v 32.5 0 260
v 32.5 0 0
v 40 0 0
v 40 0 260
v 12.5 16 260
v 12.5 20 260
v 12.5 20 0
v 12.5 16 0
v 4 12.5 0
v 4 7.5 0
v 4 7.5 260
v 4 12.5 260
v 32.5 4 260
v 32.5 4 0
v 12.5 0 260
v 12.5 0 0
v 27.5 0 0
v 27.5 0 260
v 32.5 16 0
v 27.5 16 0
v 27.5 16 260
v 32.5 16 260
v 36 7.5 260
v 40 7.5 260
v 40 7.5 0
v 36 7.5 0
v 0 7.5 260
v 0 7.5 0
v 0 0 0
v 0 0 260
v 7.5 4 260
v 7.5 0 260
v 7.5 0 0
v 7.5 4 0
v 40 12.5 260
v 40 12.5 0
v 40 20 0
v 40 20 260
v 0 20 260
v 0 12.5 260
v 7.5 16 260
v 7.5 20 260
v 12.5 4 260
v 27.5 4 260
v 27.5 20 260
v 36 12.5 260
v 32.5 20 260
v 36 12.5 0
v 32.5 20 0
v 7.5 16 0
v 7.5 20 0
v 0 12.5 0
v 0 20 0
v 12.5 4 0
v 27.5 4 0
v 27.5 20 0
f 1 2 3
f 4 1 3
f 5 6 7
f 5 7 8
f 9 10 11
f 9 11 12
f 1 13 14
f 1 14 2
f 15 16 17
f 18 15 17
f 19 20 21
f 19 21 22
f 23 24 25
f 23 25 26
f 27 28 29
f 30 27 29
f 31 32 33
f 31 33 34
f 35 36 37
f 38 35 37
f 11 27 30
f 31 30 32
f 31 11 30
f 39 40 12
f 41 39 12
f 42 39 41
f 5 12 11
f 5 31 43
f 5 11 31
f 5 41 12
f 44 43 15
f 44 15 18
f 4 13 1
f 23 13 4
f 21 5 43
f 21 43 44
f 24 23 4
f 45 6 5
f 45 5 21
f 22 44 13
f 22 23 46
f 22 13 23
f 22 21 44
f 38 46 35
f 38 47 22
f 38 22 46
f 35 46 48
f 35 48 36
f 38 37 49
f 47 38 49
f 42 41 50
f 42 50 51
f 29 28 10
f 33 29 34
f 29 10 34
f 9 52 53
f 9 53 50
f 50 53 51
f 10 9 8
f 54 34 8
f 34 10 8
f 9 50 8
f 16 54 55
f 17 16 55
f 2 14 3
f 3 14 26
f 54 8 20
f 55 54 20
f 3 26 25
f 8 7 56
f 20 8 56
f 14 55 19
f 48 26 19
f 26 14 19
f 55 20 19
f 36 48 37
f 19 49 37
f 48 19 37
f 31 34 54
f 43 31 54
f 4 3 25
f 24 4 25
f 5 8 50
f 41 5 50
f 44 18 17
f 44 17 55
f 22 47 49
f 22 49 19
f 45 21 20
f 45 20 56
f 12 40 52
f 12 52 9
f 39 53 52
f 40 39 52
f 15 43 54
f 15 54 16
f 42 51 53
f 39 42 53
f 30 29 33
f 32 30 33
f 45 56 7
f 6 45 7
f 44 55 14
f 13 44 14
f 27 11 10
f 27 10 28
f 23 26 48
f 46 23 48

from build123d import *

# Parameters (mm, degrees)
ESQUISSE1_W        = 3.5
ESQUISSE1_H        = 5
ESQUISSE1_W_2      = 5
ESQUISSE1_H_2      = 3.5
ESQUISSE1_W_3      = 4
BOSS_EXTRU_1_DEPTH = 260


with BuildPart() as part:
    # Esquisse1 → Boss.-Extru.1 (new body)
    with BuildSketch(Plane.XY):
        Polygon((7.5, 16), (7.5, 20), (0, 20), (4, 16), align=None)
        Polygon((4, 16), (0, 20), (0, 12.5), (4, 12.5), align=None)
        Polygon((4, 7.5), (0, 7.5), (0, 0), (4, 4), align=None)
        Polygon((0, 0), (7.5, 0), (7.5, 4), (4, 4), align=None)
        Polygon((4, 4), (7.5, 7.5), (4, 7.5), align=None)
        Polygon((7.5, 4), (7.5, 7.5), (4, 4), align=None)
        Polygon((4, 12.5), (7.5, 12.5), (4, 16), align=None)
        Polygon((7.5, 12.5), (7.5, 16), (4, 16), align=None)
        with Locations((5.75, 10)):
            Rectangle(ESQUISSE1_W, ESQUISSE1_H)
        Polygon((7.5, 7.5), (10, 10), (7.5, 12.5), align=None)
        Polygon((10, 10), (12.5, 12.5), (7.5, 12.5), align=None)
        Polygon((12.5, 7.5), (12.5, 12.5), (10, 10), align=None)
        Polygon((12.5, 7.5), (10, 10), (7.5, 7.5), align=None)
        Polygon((16, 4), (12.5, 7.5), (12.5, 4), align=None)
        Polygon((16, 4), (16, 7.5), (12.5, 7.5), align=None)
        Polygon((20, 0), (20, 7.5), (16, 7.5), (16, 4), align=None)
        with Locations((10, 14.25)):
            Rectangle(ESQUISSE1_W_2, ESQUISSE1_H_2)
        with Locations((14.25, 10)):
            Rectangle(ESQUISSE1_W, ESQUISSE1_H)
        Polygon((12.5, 12.5), (16, 16), (12.5, 16), align=None)
        Polygon((16, 16), (20, 20), (12.5, 20), (12.5, 16), align=None)
        Polygon((16, 12.5), (16, 16), (12.5, 12.5), align=None)
        Polygon((20, 12.5), (20, 20), (16, 16), (16, 12.5), align=None)
        Polygon((12.5, 0), (20, 0), (16, 4), (12.5, 4), align=None)
        with Locations((10, 5.75)):
            Rectangle(ESQUISSE1_W_2, ESQUISSE1_H_2)
        with Locations((18, 10)):
            Rectangle(ESQUISSE1_W_3, ESQUISSE1_H)
        with Locations((22, 10)):
            Rectangle(ESQUISSE1_W_3, ESQUISSE1_H)
        Polygon((24, 16), (20, 20), (20, 12.5), (24, 12.5), align=None)
        Polygon((27.5, 20), (20, 20), (24, 16), (27.5, 16), align=None)
        Polygon((27.5, 12.5), (24, 16), (24, 12.5), align=None)
        Polygon((27.5, 16), (24, 16), (27.5, 12.5), align=None)
        with Locations((25.75, 10)):
            Rectangle(ESQUISSE1_W, ESQUISSE1_H)
        Polygon((27.5, 7.5), (24, 7.5), (24, 4), align=None)
        Polygon((24, 7.5), (20, 7.5), (20, 0), (24, 4), align=None)
        Polygon((24, 4), (20, 0), (27.5, 0), (27.5, 4), align=None)
        Polygon((27.5, 4), (27.5, 7.5), (24, 4), align=None)
        with Locations((30, 5.75)):
            Rectangle(ESQUISSE1_W_2, ESQUISSE1_H_2)
        Polygon((36, 4), (32.5, 7.5), (32.5, 4), align=None)
        Polygon((36, 7.5), (32.5, 7.5), (36, 4), align=None)
        Polygon((40, 0), (40, 7.5), (36, 7.5), (36, 4), align=None)
        Polygon((32.5, 4), (32.5, 0), (40, 0), (36, 4), align=None)
        with Locations((34.25, 10)):
            Rectangle(ESQUISSE1_W, ESQUISSE1_H)
        Polygon((32.5, 12.5), (30, 10), (32.5, 7.5), align=None)
        Polygon((32.5, 7.5), (30, 10), (27.5, 7.5), align=None)
        Polygon((30, 10), (27.5, 12.5), (27.5, 7.5), align=None)
        Polygon((32.5, 12.5), (27.5, 12.5), (30, 10), align=None)
        Polygon((36, 16), (32.5, 12.5), (36, 12.5), align=None)
        Polygon((36, 16), (32.5, 16), (32.5, 12.5), align=None)
        Polygon((40, 20), (32.5, 20), (32.5, 16), (36, 16), align=None)
        Polygon((40, 12.5), (40, 20), (36, 16), (36, 12.5), align=None)
        with Locations((30, 14.25)):
            Rectangle(ESQUISSE1_W_2, ESQUISSE1_H_2)
    extrude(amount=BOSS_EXTRU_1_DEPTH)


solid = part.part
